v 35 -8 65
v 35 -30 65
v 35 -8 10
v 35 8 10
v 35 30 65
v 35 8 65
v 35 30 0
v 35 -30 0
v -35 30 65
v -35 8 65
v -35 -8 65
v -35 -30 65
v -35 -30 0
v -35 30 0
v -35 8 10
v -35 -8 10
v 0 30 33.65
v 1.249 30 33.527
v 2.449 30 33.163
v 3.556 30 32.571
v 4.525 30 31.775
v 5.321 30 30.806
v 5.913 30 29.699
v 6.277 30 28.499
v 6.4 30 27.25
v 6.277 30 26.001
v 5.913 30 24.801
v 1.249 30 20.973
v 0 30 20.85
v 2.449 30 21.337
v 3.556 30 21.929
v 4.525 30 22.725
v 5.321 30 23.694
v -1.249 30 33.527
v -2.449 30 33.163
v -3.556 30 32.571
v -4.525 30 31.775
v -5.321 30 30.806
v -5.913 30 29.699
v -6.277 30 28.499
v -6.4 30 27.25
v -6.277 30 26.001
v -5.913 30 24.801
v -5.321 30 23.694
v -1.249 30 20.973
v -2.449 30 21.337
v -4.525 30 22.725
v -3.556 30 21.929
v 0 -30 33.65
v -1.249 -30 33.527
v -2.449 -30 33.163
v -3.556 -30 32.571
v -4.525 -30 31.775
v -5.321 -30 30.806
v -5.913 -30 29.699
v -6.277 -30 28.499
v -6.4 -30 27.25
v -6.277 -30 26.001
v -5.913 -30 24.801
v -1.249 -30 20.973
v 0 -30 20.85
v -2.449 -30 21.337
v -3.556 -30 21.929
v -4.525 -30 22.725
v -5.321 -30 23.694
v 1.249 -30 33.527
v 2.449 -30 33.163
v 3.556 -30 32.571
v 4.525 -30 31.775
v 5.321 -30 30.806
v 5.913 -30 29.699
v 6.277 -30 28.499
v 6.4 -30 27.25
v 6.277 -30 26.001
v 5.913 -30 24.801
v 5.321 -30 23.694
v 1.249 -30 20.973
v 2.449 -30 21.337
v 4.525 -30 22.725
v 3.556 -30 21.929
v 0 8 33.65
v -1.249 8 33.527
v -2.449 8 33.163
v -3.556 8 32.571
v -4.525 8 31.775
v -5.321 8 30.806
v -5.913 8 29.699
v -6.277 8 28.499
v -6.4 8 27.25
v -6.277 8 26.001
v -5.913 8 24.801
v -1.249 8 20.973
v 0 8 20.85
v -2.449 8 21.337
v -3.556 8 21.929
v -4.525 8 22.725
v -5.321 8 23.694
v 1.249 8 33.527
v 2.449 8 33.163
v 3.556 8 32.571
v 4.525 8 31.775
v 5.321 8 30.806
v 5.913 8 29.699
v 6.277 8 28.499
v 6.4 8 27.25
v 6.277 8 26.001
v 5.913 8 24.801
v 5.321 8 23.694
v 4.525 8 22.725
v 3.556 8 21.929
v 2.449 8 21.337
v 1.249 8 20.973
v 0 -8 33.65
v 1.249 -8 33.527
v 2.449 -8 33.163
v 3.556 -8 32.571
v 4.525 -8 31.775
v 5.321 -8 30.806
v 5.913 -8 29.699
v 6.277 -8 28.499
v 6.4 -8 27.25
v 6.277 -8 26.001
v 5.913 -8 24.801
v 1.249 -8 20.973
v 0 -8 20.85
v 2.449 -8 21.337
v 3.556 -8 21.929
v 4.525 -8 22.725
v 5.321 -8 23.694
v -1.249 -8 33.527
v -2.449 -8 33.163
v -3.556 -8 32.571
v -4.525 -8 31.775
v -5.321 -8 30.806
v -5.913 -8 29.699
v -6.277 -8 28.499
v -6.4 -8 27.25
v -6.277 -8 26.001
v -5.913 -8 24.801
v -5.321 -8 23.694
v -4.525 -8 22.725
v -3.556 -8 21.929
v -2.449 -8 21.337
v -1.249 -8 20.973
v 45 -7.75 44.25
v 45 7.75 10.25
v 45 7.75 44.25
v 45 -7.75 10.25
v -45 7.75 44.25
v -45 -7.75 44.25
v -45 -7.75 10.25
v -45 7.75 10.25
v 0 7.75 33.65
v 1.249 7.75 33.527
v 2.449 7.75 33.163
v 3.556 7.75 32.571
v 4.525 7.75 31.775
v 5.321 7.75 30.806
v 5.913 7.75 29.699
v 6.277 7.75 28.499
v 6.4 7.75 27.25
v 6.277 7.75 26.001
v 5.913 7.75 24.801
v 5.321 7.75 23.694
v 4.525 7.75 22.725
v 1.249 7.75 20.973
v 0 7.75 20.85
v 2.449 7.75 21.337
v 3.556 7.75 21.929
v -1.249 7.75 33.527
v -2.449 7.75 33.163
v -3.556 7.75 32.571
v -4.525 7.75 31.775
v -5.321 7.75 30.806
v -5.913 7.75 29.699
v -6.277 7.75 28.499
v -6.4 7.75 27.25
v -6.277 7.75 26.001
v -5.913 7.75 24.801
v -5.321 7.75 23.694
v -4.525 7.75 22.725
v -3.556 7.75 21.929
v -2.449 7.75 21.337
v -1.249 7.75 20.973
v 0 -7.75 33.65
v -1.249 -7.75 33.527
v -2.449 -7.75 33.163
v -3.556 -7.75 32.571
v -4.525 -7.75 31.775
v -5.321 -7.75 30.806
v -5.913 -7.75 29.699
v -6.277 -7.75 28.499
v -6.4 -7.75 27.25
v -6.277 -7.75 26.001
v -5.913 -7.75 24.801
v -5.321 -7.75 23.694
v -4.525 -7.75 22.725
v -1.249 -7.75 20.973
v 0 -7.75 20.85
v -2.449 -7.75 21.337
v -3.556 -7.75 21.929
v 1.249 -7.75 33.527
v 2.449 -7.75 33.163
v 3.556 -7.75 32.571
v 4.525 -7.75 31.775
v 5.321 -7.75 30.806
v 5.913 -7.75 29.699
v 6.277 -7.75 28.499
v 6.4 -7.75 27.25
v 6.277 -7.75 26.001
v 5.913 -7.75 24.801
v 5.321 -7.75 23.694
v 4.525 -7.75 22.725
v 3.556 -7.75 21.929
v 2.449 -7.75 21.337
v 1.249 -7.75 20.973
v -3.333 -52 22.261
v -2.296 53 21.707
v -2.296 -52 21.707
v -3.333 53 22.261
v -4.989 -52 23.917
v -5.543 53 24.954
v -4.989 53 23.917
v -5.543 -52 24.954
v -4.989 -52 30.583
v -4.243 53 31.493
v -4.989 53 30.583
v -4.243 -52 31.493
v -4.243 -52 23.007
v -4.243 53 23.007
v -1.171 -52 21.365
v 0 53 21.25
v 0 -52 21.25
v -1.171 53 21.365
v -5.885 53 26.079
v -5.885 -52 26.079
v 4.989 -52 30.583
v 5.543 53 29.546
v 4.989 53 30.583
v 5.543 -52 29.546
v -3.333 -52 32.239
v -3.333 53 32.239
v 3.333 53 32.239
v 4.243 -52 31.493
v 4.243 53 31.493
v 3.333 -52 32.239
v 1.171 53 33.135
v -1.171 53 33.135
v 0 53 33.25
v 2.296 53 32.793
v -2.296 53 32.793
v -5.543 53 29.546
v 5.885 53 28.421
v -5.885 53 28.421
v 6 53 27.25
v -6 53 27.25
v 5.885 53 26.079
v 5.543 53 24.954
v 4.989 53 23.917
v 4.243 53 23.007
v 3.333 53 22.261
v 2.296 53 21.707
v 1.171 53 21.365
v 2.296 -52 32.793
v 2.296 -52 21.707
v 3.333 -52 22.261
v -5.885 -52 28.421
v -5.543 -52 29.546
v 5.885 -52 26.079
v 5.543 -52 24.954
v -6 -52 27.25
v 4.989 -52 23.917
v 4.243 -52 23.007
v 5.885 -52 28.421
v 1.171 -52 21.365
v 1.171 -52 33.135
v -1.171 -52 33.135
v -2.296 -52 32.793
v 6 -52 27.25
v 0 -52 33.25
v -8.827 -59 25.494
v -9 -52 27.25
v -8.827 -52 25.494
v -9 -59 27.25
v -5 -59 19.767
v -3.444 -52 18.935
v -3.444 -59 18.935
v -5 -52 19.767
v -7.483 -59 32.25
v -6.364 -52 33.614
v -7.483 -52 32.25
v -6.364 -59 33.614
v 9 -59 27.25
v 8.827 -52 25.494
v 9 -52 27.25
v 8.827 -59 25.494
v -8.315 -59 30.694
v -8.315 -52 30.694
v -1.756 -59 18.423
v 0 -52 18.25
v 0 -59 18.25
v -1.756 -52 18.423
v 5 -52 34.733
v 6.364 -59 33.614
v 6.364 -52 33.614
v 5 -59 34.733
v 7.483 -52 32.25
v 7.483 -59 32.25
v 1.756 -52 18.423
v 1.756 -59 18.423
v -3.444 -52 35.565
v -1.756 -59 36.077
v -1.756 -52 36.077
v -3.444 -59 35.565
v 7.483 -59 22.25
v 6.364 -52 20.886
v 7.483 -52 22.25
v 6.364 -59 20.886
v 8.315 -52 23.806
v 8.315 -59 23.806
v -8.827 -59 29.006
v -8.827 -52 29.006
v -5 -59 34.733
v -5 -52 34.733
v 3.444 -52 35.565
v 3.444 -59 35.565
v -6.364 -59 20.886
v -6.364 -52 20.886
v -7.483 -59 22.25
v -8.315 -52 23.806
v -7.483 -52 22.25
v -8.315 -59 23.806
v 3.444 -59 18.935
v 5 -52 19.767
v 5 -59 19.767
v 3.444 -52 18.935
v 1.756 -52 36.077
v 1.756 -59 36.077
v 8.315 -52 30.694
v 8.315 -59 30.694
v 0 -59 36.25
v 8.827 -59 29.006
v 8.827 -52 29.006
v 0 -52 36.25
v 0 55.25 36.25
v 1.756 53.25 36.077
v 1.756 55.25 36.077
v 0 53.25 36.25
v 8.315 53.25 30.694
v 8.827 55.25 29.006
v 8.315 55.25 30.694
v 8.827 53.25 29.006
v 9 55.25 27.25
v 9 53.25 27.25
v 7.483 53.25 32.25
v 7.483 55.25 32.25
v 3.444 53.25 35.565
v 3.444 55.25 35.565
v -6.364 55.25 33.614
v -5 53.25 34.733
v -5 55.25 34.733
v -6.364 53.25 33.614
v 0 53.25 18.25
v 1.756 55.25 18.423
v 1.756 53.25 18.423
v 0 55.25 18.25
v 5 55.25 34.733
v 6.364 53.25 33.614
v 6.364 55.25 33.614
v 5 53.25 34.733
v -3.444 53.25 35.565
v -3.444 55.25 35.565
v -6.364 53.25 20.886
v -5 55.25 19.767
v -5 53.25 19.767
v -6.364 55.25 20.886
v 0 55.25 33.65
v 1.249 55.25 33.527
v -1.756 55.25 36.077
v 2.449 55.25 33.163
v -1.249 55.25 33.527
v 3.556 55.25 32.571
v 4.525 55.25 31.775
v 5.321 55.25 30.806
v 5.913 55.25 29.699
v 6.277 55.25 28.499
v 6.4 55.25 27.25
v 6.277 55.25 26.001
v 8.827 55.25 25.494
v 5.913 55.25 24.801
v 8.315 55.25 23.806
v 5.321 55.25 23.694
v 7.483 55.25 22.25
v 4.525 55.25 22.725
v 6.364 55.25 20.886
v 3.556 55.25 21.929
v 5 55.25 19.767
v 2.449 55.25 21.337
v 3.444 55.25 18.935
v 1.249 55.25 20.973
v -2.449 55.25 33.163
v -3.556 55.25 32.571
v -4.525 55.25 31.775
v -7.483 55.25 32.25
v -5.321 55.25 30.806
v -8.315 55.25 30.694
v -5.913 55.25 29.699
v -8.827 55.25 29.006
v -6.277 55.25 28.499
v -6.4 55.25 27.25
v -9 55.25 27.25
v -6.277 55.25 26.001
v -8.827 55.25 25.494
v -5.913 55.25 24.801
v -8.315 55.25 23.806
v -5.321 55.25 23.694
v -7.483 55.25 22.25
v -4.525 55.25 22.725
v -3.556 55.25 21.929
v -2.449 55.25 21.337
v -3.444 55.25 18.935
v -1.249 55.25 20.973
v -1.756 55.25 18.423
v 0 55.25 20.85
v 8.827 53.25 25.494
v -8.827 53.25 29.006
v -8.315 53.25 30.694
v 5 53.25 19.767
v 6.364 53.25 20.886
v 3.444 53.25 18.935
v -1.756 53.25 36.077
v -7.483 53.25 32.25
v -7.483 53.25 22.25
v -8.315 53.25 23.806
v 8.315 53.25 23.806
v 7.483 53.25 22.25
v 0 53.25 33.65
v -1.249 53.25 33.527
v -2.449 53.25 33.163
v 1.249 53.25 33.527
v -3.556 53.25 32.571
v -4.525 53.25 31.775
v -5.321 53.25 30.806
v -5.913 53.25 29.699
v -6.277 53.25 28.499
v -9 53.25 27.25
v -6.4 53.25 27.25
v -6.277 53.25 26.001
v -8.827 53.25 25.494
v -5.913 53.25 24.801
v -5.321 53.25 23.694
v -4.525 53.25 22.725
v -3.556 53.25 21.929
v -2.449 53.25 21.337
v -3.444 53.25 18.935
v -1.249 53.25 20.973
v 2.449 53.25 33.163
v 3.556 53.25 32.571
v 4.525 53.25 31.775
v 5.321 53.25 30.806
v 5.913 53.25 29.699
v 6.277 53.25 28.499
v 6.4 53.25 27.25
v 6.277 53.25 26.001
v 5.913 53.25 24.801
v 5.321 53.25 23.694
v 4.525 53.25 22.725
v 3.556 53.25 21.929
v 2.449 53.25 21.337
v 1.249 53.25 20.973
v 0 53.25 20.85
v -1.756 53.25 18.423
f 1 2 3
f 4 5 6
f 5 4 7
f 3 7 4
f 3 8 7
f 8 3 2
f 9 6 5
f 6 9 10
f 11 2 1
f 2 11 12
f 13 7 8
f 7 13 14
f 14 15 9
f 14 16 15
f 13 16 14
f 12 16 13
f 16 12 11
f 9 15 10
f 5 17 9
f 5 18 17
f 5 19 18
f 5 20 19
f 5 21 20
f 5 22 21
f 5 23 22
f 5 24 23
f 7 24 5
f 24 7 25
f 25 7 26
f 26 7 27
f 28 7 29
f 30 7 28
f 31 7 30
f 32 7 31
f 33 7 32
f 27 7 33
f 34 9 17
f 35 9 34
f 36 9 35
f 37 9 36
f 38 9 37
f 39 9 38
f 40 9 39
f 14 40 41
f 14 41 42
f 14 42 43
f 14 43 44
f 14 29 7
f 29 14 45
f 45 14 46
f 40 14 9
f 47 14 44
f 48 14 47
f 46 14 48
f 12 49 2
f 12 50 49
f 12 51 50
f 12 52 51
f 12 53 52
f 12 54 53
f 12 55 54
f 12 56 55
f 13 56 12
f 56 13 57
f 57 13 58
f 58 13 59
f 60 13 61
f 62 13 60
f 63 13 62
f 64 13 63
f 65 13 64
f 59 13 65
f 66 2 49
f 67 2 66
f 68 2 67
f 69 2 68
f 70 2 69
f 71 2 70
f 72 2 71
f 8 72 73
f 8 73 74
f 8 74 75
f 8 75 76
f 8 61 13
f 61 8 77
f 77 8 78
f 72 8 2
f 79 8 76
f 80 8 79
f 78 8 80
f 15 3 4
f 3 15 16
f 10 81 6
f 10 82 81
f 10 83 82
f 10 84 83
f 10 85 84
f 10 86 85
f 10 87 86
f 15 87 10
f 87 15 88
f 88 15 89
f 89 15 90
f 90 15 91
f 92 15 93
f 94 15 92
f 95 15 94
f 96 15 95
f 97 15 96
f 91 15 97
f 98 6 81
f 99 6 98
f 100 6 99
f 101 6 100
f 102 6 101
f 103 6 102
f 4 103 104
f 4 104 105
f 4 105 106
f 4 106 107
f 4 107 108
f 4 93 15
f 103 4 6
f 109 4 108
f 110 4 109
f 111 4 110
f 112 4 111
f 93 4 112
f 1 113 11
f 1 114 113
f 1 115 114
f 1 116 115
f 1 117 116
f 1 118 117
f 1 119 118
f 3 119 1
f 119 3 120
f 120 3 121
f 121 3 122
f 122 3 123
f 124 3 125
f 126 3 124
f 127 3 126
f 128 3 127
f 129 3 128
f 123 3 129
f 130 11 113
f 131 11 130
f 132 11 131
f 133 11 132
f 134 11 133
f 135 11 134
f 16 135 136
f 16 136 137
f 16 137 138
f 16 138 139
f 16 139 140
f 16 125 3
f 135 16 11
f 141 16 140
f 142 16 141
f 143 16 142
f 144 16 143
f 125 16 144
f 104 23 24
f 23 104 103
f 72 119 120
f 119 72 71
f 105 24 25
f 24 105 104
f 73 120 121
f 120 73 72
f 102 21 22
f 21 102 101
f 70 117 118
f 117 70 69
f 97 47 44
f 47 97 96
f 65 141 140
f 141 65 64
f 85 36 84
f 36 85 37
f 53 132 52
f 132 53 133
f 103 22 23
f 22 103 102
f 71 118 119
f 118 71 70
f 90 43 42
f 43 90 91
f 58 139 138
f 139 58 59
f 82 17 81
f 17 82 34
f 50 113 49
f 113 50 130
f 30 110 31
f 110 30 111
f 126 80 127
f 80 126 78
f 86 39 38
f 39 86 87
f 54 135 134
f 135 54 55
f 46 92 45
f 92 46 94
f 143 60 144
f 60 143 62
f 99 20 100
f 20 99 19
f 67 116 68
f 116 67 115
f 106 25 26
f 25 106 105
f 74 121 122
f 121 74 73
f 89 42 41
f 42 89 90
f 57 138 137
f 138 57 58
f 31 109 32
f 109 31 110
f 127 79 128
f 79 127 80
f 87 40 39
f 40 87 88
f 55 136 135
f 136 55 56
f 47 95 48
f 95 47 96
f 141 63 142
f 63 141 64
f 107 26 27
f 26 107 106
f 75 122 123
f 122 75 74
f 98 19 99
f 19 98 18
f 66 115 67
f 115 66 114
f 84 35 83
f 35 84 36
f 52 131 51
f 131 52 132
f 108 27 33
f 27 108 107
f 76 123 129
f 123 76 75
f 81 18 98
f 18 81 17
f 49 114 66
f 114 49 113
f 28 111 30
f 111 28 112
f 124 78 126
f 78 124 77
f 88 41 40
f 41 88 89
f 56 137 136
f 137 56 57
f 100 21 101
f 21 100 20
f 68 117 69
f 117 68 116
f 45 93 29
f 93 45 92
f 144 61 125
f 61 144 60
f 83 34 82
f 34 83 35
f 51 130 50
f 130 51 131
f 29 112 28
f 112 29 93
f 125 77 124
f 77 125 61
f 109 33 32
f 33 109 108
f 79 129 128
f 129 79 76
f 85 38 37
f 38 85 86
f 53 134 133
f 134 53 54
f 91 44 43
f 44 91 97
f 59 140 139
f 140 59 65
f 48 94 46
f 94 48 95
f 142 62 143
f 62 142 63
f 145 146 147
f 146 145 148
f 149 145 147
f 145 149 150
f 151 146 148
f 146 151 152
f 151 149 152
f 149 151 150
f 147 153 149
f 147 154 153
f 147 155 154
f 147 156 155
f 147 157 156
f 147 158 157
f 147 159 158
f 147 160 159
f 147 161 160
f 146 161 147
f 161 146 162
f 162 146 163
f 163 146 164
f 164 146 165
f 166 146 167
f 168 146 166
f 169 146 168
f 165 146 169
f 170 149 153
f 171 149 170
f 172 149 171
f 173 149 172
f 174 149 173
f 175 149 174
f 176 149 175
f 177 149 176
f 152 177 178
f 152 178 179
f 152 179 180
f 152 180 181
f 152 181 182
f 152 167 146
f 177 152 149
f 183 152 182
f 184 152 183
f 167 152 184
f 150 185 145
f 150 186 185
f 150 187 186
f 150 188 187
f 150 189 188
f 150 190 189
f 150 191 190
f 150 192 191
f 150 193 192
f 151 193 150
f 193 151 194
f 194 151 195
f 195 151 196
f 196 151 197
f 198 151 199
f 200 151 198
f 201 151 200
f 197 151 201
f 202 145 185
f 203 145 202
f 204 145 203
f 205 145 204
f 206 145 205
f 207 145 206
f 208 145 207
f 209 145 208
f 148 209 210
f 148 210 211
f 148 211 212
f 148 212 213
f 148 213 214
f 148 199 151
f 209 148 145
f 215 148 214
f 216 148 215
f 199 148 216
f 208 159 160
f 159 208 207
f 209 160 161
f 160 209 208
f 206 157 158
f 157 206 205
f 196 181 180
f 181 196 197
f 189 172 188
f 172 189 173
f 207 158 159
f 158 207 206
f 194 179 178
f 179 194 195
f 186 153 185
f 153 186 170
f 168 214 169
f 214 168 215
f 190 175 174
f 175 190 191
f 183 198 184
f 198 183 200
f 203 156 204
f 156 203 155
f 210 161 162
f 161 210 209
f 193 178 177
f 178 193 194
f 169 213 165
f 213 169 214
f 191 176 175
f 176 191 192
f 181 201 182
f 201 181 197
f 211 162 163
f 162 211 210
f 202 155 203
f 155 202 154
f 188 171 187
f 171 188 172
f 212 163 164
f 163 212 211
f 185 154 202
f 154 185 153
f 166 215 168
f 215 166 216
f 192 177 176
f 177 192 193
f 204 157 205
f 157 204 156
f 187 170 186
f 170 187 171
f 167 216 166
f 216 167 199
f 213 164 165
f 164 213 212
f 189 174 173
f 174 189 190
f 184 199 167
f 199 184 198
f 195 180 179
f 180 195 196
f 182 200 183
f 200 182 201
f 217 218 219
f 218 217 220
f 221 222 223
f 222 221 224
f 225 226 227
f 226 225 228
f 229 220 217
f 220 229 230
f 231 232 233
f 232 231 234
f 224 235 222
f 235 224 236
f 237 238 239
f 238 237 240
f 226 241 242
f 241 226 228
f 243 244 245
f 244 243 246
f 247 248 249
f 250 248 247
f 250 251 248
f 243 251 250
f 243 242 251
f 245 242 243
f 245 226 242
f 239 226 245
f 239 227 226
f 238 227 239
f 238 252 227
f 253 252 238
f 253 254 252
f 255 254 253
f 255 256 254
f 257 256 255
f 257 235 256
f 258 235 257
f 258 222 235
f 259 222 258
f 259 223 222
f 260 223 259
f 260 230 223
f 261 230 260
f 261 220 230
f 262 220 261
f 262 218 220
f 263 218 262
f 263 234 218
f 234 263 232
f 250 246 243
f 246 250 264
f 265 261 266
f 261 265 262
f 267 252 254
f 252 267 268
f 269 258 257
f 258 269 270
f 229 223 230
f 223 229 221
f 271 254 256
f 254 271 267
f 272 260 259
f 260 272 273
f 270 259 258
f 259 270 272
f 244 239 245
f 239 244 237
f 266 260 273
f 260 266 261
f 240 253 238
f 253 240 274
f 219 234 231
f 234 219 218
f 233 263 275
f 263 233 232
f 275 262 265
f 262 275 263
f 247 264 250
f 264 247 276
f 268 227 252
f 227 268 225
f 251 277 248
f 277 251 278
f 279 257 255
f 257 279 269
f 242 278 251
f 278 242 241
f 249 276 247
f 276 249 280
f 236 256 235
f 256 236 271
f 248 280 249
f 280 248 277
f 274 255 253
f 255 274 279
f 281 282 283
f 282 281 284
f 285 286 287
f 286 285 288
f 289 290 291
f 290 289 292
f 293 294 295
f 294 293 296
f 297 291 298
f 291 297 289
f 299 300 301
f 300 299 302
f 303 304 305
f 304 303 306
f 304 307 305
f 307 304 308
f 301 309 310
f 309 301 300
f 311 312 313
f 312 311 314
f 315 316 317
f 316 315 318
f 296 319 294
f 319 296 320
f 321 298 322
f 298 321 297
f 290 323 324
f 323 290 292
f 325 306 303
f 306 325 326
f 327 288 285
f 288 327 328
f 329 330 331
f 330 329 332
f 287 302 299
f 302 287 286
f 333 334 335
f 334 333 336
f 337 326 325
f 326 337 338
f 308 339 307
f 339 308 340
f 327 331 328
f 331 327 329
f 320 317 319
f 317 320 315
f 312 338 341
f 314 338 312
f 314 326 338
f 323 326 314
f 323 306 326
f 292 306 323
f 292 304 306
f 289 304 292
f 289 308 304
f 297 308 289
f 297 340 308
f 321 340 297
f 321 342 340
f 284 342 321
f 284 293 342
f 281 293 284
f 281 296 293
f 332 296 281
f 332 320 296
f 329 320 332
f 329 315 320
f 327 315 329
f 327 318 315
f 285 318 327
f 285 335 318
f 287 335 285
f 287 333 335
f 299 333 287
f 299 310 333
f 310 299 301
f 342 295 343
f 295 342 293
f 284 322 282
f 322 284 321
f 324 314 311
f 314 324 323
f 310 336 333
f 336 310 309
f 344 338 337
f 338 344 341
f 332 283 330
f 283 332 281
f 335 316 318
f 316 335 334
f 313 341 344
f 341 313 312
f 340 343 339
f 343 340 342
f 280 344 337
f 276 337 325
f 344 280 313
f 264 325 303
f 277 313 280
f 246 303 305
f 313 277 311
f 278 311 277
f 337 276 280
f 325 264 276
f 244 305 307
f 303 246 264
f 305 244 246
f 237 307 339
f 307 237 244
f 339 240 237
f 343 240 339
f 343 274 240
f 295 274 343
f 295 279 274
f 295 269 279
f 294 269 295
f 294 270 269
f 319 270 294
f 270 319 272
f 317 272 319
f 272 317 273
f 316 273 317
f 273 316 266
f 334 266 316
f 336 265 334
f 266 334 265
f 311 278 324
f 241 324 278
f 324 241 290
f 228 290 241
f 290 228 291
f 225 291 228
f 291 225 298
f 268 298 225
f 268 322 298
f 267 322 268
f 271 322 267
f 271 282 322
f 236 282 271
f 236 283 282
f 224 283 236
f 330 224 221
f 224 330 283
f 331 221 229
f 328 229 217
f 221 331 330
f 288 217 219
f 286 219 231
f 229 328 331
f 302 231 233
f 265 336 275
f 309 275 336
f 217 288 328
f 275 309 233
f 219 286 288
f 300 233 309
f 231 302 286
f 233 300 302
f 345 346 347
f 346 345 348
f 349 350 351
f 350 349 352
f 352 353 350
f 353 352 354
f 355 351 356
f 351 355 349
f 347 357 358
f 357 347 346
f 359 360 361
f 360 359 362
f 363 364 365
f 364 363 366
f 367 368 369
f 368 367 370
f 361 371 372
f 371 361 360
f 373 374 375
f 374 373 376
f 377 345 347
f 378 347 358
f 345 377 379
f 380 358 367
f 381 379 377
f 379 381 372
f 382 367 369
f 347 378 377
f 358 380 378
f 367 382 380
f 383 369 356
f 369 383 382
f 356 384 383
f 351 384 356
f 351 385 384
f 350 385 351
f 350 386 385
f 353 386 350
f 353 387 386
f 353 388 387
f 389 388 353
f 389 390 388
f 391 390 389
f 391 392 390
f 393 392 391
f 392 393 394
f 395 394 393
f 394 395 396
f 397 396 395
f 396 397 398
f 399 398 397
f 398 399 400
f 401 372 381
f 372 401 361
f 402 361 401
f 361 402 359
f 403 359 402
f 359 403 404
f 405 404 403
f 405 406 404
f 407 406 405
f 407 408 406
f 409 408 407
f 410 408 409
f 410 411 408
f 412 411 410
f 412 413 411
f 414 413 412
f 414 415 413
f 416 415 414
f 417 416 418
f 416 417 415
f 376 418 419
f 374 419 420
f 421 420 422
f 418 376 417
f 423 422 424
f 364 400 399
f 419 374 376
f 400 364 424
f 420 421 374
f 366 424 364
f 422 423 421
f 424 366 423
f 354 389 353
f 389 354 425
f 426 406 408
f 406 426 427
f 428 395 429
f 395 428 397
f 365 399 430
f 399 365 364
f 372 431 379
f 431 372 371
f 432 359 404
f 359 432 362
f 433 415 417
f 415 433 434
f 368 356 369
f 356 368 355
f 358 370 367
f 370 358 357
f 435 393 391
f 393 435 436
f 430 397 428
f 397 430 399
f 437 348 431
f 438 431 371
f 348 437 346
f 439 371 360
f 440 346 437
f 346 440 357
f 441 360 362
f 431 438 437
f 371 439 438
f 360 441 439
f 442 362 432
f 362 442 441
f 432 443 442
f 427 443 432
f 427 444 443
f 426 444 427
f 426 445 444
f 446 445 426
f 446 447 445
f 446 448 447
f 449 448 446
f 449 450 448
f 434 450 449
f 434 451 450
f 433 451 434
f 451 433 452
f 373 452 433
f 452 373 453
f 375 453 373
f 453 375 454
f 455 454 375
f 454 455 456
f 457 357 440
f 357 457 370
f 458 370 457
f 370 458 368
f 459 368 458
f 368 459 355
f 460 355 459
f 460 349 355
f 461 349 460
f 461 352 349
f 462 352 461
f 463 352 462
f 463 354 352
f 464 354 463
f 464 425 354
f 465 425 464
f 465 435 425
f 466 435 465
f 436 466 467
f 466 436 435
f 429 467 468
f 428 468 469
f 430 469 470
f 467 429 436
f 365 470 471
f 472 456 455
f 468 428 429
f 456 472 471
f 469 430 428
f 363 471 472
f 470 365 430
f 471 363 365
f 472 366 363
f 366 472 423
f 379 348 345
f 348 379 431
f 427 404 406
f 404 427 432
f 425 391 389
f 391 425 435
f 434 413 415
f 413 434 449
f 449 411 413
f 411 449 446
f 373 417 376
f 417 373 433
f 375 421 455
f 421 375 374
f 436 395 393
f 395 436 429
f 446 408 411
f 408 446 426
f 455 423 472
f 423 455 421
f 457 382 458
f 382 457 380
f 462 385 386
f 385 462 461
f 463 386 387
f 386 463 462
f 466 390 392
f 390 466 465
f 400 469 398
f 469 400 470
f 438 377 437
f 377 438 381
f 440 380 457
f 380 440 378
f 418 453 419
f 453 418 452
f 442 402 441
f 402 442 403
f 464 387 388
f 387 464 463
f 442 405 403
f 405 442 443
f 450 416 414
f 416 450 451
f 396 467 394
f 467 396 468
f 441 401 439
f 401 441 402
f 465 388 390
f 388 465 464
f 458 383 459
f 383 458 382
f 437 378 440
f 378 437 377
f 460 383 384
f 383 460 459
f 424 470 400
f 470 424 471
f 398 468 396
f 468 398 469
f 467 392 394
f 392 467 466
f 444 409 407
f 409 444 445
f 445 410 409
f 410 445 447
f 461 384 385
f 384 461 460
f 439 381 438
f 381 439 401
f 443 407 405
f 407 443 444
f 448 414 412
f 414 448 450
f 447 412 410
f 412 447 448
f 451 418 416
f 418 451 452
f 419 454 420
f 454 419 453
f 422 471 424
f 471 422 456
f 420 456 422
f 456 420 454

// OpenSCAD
$fn = 32;

// ------------------------------------------------------------------------
// Clevis joint: 70 mm clevis, pin d12
// Every part is its own module, assembly() places them once.
// ------------------------------------------------------------------------

// --- part 1 ---
module clevis() {
  difference() {
    translate([-35, -30, 0]) cube([70, 60, 65]);
    translate([-36, -8, 10]) cube([72, 16, 56]);
    translate([0, 0, 27.25]) rotate([90, 0, 0]) cylinder(h = 62, d = 12.8, center = true);
  }
}

// --- part 2 ---
module eye() {
  difference() {
    translate([-45, -7.75, 0]) cube([90, 15.5, 34]);
    translate([0, 0, 17]) rotate([90, 0, 0]) cylinder(h = 17.5, d = 12.8, center = true);
  }
}

// --- part 3 ---
module pin() {
  rotate([0, 90, 0]) cylinder(h = 106, d = 12, center = true);
  translate([-59, 0, 0]) rotate([0, 90, 0]) cylinder(h = 7, d = 18);
}

// --- part 4 ---
module retainer() {
  difference() {
      translate([0, 0, 0]) cylinder(h = 2, d = 18);
      translate([0, 0, -1]) cylinder(h = 4, d = 12.8);
    }
}

// --- assembly ---
module assembly() {
  translate([0, 0, 0]) rotate([0, 0, 0]) clevis();
  translate([0, 0, 10.25]) rotate([0, 0, 0]) eye();
  translate([0, 0, 27.25]) rotate([0, 0, 90]) pin();
  translate([0, 55.25, 27.25]) rotate([90, 0, 0]) retainer();
}

assembly();
